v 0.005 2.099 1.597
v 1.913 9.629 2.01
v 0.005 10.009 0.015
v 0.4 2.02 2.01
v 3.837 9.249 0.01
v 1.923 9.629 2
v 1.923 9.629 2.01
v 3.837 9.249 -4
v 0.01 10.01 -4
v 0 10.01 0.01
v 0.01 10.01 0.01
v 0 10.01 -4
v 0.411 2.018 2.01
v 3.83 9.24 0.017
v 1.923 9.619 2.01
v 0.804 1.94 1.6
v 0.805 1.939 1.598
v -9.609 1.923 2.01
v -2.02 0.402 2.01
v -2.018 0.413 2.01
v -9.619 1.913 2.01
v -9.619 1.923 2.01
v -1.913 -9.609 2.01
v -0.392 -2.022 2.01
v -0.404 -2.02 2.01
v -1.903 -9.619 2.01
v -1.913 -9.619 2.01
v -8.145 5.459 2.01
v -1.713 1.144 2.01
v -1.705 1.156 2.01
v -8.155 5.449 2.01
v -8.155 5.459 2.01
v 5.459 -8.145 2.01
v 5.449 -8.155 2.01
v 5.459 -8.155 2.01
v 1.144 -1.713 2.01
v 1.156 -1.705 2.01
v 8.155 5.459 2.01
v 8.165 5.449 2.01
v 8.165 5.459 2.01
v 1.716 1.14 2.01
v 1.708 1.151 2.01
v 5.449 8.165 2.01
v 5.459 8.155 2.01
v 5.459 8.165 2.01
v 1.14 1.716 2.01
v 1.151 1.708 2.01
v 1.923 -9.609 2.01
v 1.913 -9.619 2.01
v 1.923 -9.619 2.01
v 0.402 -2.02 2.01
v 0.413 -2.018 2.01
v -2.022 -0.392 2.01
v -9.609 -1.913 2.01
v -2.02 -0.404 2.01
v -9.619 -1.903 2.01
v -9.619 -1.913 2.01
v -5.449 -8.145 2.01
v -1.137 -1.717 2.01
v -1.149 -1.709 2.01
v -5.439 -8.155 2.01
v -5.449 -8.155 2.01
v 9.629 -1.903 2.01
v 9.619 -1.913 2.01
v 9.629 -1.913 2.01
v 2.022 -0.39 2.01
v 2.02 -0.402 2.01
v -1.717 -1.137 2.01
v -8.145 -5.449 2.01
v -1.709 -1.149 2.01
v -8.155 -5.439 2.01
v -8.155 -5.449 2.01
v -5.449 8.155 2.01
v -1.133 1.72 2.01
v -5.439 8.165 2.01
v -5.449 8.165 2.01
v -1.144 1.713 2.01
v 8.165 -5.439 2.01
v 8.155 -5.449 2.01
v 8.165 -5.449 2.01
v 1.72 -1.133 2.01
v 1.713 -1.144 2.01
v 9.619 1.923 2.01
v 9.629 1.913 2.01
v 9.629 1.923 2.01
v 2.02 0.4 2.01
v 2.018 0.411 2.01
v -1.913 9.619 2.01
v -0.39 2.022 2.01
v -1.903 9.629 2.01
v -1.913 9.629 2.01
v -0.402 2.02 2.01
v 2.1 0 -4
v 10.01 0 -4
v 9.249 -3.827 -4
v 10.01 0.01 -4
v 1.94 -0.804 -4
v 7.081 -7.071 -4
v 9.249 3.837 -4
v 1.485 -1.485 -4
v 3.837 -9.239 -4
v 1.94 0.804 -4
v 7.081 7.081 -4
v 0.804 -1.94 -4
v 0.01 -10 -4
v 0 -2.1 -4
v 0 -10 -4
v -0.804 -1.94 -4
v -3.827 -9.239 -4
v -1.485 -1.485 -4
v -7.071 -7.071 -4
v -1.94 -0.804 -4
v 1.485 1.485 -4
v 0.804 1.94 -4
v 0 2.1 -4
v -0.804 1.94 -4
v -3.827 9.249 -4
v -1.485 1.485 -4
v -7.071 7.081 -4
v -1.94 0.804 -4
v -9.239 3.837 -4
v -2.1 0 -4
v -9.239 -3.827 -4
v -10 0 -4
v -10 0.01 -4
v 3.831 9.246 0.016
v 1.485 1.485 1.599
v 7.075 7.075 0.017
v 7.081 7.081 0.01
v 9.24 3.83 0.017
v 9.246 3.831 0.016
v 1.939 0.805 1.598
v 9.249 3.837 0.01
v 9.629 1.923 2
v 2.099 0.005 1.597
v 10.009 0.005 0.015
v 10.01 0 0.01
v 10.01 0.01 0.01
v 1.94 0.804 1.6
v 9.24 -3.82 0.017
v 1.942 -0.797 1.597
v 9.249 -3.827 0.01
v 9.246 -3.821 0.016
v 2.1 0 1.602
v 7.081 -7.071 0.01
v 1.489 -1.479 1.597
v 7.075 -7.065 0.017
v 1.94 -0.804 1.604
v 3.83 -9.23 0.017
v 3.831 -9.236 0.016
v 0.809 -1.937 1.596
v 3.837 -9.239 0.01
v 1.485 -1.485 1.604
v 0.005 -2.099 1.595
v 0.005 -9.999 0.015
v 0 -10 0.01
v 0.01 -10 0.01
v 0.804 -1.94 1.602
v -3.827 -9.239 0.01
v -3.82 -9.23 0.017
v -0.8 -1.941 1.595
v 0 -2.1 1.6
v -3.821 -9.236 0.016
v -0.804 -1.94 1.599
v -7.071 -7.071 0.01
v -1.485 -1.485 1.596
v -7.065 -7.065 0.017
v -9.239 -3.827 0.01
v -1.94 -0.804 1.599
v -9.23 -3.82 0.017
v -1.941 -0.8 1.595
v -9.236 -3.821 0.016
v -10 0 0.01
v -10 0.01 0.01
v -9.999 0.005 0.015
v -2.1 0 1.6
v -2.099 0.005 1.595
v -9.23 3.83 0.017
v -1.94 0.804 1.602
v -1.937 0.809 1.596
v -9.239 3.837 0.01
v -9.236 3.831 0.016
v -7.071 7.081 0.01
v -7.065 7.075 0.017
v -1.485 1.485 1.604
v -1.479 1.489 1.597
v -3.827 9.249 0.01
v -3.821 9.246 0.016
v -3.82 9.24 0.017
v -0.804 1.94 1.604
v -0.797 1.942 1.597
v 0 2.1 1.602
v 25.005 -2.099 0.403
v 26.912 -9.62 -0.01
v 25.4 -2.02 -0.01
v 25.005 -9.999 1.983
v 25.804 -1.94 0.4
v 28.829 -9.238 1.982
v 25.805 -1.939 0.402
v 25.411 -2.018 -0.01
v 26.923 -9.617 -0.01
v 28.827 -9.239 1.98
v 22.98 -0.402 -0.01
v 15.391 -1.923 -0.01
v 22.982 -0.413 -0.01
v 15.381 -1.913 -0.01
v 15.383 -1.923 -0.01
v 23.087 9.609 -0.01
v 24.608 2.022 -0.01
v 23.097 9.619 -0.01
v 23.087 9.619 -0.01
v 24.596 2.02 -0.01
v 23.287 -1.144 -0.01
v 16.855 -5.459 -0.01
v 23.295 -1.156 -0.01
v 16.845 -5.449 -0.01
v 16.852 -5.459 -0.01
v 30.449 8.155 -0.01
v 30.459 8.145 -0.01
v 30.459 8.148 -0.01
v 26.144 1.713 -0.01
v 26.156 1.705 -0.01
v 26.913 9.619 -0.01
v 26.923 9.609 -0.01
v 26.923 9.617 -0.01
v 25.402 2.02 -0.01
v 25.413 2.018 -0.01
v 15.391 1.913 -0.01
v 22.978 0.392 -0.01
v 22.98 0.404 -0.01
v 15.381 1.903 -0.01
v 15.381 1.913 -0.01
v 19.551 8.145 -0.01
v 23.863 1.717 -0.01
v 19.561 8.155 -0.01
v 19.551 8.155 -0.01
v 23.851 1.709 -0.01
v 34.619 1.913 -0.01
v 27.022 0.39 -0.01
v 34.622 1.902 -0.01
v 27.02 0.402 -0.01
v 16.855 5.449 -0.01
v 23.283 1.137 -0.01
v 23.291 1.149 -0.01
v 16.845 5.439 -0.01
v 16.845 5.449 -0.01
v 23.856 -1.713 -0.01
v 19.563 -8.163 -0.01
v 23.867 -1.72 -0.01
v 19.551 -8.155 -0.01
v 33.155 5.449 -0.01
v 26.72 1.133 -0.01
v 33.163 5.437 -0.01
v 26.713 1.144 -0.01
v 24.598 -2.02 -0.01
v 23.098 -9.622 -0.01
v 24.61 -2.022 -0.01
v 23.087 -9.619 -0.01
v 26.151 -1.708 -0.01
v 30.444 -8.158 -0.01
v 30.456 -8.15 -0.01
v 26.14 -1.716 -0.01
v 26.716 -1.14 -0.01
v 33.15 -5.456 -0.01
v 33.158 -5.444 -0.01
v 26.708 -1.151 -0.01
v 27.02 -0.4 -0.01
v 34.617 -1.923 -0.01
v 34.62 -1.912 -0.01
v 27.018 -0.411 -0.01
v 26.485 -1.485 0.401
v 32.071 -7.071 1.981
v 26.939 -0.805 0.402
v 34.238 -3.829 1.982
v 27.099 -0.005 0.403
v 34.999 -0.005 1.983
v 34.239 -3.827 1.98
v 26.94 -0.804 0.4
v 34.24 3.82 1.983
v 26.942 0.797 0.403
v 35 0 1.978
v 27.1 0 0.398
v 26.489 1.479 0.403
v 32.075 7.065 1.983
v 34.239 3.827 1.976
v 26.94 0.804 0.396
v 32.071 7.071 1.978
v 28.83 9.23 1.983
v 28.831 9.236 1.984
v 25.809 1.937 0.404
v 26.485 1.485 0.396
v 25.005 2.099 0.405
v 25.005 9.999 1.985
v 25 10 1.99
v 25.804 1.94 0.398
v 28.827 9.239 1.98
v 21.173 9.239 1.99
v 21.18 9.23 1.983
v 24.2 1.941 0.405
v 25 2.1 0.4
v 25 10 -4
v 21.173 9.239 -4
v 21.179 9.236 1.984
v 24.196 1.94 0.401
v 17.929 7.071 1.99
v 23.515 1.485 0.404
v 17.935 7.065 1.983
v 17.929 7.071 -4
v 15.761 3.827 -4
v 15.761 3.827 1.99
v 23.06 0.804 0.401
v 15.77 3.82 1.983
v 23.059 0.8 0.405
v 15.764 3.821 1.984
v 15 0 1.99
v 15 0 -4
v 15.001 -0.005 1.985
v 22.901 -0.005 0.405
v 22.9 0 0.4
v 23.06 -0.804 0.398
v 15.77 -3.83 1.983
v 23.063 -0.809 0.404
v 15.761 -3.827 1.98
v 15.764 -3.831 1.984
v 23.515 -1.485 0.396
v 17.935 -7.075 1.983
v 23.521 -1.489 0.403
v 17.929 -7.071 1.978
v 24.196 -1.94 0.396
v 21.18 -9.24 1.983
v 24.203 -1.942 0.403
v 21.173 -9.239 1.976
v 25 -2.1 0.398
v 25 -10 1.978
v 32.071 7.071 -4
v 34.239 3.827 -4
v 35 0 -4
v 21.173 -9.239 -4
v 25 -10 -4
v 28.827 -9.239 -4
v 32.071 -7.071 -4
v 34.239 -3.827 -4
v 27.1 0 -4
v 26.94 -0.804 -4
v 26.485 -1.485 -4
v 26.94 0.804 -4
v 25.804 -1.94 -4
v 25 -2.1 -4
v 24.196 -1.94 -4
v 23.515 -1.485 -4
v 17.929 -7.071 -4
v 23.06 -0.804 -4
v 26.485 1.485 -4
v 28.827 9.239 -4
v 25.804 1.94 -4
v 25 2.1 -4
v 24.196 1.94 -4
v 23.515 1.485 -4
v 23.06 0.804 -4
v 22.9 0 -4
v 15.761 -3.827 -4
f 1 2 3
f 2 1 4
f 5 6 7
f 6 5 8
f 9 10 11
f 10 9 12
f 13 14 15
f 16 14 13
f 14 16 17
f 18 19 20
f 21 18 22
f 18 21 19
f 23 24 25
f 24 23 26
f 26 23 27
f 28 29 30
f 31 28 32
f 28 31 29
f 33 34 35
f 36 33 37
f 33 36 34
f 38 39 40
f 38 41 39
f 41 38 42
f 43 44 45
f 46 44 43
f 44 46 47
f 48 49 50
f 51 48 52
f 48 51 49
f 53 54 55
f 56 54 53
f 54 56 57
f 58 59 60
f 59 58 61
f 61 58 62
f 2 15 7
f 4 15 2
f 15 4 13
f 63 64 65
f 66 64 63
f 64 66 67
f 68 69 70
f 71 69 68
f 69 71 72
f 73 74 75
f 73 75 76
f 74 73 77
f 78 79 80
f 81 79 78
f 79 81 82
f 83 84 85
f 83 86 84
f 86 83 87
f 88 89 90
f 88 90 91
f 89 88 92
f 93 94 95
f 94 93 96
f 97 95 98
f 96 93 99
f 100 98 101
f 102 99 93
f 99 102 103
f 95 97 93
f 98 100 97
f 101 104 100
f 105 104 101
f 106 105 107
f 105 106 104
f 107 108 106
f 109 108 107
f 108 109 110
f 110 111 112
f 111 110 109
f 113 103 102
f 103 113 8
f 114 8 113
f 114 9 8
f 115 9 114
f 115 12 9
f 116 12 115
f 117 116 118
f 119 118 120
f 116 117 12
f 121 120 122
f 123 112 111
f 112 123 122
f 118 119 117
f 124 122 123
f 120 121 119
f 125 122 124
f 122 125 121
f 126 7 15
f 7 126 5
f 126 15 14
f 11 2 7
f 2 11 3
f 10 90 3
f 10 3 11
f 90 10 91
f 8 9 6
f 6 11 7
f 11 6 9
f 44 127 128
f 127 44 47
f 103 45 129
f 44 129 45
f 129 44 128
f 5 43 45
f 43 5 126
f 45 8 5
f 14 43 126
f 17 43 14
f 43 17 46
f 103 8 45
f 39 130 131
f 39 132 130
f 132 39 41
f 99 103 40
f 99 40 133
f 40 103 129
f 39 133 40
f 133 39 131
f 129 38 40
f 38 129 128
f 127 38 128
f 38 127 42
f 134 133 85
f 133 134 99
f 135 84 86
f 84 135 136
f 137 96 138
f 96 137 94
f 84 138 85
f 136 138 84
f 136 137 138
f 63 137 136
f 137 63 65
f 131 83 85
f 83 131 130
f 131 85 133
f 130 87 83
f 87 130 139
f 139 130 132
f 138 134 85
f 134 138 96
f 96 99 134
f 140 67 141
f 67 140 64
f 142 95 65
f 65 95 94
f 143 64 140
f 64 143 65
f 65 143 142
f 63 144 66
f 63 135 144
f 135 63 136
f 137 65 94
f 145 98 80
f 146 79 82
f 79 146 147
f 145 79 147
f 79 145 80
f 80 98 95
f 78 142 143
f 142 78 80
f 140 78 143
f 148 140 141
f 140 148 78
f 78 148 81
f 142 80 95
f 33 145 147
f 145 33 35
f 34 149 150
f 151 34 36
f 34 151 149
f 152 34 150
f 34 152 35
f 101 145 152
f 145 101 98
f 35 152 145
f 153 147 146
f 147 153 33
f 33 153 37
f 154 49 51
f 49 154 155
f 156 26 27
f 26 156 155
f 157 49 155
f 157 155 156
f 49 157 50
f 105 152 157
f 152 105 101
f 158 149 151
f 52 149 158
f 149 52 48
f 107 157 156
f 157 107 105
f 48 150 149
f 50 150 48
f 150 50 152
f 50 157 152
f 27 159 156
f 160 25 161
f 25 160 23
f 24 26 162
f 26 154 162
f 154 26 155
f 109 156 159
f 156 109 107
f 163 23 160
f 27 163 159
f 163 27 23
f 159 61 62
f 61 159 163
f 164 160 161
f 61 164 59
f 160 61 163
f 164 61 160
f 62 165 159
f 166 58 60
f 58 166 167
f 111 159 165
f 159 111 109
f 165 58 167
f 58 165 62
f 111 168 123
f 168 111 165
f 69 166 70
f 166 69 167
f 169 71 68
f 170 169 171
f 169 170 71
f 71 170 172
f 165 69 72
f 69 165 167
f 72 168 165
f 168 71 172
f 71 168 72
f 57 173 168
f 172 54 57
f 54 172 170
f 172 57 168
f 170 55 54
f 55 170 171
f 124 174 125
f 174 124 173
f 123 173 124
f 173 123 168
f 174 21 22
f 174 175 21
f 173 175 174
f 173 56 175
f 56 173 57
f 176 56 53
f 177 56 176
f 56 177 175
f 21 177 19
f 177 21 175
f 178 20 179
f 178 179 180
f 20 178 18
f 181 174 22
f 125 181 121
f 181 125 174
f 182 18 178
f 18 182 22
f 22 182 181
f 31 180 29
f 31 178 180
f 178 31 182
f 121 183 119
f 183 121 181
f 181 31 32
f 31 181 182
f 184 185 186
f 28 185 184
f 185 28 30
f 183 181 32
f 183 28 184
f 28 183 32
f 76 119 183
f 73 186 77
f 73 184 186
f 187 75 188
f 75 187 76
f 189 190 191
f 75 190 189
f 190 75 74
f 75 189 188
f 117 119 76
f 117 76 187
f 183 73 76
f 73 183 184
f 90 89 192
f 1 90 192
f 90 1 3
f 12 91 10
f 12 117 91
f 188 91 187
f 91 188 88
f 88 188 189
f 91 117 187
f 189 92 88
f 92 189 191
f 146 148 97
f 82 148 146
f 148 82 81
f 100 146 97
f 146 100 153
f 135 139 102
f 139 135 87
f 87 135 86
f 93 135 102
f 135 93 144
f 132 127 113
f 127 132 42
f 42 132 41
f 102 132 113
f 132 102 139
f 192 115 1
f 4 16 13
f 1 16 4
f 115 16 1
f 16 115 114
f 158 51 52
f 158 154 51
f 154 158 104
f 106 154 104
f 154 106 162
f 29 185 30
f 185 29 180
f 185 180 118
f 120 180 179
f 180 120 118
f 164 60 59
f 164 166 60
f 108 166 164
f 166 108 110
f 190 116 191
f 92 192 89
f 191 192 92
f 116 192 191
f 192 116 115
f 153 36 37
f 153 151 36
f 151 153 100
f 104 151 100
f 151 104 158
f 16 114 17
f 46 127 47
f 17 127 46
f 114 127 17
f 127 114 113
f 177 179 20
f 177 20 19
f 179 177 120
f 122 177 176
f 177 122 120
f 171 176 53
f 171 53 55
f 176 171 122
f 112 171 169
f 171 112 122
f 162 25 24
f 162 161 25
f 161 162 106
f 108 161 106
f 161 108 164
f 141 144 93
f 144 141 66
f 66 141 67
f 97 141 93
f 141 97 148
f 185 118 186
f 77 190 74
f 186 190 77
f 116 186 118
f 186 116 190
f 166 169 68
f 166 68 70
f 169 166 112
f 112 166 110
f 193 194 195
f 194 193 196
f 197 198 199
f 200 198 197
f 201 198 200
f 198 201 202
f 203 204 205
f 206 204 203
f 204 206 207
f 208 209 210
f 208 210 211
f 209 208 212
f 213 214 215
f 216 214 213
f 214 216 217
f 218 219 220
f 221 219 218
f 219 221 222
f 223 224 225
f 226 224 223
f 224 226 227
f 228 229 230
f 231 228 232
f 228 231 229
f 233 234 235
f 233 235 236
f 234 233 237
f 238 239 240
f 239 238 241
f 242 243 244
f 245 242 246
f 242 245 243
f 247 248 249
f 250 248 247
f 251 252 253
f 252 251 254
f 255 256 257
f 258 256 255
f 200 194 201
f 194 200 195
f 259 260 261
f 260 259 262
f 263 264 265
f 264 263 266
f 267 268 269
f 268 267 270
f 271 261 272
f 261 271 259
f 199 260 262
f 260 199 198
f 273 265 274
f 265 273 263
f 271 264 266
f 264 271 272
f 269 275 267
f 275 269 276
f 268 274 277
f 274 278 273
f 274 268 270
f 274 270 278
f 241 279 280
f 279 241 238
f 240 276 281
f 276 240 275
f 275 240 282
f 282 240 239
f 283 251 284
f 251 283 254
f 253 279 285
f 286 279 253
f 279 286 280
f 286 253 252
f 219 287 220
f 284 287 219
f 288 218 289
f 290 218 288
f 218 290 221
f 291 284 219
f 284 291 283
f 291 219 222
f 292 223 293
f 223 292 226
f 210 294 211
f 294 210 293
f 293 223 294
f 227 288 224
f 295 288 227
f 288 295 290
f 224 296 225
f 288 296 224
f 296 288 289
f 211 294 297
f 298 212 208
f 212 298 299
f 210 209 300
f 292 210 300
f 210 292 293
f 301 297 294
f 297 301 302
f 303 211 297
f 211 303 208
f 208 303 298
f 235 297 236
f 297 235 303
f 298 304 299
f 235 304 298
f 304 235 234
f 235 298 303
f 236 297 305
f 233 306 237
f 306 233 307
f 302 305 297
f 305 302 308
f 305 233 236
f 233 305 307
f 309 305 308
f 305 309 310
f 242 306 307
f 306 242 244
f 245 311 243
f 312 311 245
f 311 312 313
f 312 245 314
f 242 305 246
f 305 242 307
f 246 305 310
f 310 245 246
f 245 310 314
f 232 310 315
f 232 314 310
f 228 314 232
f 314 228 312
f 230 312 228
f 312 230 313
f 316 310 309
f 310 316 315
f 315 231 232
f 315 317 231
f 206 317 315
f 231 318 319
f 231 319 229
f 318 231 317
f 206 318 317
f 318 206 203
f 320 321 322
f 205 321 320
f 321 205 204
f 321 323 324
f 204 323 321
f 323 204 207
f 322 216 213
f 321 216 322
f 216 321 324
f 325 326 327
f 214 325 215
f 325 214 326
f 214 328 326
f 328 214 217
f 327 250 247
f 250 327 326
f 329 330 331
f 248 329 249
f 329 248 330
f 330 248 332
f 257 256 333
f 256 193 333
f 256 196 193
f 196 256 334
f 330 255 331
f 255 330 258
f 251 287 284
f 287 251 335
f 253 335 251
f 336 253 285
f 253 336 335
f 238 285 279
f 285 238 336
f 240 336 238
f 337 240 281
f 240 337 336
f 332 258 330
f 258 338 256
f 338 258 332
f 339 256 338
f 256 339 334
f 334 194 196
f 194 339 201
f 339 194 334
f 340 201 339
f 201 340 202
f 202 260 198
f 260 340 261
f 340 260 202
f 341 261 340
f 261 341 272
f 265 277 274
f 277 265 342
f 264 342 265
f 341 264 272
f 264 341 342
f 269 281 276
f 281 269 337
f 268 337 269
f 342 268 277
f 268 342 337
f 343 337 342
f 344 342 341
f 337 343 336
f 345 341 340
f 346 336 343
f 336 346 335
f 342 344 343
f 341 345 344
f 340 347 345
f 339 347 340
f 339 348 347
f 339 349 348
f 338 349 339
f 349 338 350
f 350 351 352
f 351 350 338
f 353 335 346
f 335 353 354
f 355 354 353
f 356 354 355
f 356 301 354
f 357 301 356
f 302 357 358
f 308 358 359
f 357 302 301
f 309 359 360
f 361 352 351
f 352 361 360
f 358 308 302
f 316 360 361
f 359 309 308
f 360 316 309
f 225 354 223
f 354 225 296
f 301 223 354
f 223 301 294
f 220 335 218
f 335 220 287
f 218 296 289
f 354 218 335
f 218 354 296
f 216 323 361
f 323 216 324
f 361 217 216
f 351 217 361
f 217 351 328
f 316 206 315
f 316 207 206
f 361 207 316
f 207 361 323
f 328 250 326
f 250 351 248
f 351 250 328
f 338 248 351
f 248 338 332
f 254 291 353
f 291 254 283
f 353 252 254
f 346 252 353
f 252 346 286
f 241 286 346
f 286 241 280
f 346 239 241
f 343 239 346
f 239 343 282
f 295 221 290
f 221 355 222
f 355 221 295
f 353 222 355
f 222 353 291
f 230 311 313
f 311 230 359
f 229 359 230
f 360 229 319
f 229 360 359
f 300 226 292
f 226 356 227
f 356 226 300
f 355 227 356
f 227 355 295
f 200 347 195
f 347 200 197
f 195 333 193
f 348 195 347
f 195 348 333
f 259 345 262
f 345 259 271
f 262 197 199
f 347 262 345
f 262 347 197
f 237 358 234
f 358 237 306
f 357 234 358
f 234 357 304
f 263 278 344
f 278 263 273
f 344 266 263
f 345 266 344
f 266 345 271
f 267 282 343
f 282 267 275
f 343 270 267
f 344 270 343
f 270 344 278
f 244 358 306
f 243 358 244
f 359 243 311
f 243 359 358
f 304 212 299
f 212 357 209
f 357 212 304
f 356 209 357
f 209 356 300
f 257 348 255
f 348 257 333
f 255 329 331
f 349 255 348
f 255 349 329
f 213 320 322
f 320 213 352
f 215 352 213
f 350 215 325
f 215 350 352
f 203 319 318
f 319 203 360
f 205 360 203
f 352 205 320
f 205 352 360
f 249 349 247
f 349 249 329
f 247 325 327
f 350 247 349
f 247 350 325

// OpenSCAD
$fn = 16;

gearH = 2;
supportH = 4;
radius = 10;
teeth = $fn;

angleFactor = 360 / teeth;

module hinge() {
    for(r=[0:teeth-1]) {

        angle1 = angleFactor * r;
        angle2 = angleFactor * (r + 1);

        x1 = radius * sin(angle1);
        y1 = radius * cos(angle1);

        x2 = radius * sin(angle2);
        y2 = radius * cos(angle2);        
        
        hull() {
            translate ([0,0,0]) cube(0.01);
            translate ([x1, y1, 0]) cube(0.01);
            translate([x2,y2,0]) cube(0.01);
            translate([0, 0, gearH]) cube(0.01);
            translate([(x1+x2)/2, (y1+y2)/2, gearH]) cube(0.01);
            translate([0,0,-supportH]) cube(0.01);
            translate([x1,y1,-supportH]) cube(0.01);
            translate([x2,y2,-supportH]) cube(0.01);            
        }  
    }
}

difference() {
    hinge();
    translate ([0,0,-100]) cylinder(r=2.1, h=1000, center=true);
}

translate ([25,0,-supportH/2]) 
    difference() {
        translate([0,0,gearH/2]) cylinder(r=radius, h=supportH+gearH, center=true);
        translate([0,0,supportH]) rotate([180, 0, 0]) hinge();
        translate ([0,0,-100]) cylinder(r=2.1, h=1000, center=true);
    
    }
    
